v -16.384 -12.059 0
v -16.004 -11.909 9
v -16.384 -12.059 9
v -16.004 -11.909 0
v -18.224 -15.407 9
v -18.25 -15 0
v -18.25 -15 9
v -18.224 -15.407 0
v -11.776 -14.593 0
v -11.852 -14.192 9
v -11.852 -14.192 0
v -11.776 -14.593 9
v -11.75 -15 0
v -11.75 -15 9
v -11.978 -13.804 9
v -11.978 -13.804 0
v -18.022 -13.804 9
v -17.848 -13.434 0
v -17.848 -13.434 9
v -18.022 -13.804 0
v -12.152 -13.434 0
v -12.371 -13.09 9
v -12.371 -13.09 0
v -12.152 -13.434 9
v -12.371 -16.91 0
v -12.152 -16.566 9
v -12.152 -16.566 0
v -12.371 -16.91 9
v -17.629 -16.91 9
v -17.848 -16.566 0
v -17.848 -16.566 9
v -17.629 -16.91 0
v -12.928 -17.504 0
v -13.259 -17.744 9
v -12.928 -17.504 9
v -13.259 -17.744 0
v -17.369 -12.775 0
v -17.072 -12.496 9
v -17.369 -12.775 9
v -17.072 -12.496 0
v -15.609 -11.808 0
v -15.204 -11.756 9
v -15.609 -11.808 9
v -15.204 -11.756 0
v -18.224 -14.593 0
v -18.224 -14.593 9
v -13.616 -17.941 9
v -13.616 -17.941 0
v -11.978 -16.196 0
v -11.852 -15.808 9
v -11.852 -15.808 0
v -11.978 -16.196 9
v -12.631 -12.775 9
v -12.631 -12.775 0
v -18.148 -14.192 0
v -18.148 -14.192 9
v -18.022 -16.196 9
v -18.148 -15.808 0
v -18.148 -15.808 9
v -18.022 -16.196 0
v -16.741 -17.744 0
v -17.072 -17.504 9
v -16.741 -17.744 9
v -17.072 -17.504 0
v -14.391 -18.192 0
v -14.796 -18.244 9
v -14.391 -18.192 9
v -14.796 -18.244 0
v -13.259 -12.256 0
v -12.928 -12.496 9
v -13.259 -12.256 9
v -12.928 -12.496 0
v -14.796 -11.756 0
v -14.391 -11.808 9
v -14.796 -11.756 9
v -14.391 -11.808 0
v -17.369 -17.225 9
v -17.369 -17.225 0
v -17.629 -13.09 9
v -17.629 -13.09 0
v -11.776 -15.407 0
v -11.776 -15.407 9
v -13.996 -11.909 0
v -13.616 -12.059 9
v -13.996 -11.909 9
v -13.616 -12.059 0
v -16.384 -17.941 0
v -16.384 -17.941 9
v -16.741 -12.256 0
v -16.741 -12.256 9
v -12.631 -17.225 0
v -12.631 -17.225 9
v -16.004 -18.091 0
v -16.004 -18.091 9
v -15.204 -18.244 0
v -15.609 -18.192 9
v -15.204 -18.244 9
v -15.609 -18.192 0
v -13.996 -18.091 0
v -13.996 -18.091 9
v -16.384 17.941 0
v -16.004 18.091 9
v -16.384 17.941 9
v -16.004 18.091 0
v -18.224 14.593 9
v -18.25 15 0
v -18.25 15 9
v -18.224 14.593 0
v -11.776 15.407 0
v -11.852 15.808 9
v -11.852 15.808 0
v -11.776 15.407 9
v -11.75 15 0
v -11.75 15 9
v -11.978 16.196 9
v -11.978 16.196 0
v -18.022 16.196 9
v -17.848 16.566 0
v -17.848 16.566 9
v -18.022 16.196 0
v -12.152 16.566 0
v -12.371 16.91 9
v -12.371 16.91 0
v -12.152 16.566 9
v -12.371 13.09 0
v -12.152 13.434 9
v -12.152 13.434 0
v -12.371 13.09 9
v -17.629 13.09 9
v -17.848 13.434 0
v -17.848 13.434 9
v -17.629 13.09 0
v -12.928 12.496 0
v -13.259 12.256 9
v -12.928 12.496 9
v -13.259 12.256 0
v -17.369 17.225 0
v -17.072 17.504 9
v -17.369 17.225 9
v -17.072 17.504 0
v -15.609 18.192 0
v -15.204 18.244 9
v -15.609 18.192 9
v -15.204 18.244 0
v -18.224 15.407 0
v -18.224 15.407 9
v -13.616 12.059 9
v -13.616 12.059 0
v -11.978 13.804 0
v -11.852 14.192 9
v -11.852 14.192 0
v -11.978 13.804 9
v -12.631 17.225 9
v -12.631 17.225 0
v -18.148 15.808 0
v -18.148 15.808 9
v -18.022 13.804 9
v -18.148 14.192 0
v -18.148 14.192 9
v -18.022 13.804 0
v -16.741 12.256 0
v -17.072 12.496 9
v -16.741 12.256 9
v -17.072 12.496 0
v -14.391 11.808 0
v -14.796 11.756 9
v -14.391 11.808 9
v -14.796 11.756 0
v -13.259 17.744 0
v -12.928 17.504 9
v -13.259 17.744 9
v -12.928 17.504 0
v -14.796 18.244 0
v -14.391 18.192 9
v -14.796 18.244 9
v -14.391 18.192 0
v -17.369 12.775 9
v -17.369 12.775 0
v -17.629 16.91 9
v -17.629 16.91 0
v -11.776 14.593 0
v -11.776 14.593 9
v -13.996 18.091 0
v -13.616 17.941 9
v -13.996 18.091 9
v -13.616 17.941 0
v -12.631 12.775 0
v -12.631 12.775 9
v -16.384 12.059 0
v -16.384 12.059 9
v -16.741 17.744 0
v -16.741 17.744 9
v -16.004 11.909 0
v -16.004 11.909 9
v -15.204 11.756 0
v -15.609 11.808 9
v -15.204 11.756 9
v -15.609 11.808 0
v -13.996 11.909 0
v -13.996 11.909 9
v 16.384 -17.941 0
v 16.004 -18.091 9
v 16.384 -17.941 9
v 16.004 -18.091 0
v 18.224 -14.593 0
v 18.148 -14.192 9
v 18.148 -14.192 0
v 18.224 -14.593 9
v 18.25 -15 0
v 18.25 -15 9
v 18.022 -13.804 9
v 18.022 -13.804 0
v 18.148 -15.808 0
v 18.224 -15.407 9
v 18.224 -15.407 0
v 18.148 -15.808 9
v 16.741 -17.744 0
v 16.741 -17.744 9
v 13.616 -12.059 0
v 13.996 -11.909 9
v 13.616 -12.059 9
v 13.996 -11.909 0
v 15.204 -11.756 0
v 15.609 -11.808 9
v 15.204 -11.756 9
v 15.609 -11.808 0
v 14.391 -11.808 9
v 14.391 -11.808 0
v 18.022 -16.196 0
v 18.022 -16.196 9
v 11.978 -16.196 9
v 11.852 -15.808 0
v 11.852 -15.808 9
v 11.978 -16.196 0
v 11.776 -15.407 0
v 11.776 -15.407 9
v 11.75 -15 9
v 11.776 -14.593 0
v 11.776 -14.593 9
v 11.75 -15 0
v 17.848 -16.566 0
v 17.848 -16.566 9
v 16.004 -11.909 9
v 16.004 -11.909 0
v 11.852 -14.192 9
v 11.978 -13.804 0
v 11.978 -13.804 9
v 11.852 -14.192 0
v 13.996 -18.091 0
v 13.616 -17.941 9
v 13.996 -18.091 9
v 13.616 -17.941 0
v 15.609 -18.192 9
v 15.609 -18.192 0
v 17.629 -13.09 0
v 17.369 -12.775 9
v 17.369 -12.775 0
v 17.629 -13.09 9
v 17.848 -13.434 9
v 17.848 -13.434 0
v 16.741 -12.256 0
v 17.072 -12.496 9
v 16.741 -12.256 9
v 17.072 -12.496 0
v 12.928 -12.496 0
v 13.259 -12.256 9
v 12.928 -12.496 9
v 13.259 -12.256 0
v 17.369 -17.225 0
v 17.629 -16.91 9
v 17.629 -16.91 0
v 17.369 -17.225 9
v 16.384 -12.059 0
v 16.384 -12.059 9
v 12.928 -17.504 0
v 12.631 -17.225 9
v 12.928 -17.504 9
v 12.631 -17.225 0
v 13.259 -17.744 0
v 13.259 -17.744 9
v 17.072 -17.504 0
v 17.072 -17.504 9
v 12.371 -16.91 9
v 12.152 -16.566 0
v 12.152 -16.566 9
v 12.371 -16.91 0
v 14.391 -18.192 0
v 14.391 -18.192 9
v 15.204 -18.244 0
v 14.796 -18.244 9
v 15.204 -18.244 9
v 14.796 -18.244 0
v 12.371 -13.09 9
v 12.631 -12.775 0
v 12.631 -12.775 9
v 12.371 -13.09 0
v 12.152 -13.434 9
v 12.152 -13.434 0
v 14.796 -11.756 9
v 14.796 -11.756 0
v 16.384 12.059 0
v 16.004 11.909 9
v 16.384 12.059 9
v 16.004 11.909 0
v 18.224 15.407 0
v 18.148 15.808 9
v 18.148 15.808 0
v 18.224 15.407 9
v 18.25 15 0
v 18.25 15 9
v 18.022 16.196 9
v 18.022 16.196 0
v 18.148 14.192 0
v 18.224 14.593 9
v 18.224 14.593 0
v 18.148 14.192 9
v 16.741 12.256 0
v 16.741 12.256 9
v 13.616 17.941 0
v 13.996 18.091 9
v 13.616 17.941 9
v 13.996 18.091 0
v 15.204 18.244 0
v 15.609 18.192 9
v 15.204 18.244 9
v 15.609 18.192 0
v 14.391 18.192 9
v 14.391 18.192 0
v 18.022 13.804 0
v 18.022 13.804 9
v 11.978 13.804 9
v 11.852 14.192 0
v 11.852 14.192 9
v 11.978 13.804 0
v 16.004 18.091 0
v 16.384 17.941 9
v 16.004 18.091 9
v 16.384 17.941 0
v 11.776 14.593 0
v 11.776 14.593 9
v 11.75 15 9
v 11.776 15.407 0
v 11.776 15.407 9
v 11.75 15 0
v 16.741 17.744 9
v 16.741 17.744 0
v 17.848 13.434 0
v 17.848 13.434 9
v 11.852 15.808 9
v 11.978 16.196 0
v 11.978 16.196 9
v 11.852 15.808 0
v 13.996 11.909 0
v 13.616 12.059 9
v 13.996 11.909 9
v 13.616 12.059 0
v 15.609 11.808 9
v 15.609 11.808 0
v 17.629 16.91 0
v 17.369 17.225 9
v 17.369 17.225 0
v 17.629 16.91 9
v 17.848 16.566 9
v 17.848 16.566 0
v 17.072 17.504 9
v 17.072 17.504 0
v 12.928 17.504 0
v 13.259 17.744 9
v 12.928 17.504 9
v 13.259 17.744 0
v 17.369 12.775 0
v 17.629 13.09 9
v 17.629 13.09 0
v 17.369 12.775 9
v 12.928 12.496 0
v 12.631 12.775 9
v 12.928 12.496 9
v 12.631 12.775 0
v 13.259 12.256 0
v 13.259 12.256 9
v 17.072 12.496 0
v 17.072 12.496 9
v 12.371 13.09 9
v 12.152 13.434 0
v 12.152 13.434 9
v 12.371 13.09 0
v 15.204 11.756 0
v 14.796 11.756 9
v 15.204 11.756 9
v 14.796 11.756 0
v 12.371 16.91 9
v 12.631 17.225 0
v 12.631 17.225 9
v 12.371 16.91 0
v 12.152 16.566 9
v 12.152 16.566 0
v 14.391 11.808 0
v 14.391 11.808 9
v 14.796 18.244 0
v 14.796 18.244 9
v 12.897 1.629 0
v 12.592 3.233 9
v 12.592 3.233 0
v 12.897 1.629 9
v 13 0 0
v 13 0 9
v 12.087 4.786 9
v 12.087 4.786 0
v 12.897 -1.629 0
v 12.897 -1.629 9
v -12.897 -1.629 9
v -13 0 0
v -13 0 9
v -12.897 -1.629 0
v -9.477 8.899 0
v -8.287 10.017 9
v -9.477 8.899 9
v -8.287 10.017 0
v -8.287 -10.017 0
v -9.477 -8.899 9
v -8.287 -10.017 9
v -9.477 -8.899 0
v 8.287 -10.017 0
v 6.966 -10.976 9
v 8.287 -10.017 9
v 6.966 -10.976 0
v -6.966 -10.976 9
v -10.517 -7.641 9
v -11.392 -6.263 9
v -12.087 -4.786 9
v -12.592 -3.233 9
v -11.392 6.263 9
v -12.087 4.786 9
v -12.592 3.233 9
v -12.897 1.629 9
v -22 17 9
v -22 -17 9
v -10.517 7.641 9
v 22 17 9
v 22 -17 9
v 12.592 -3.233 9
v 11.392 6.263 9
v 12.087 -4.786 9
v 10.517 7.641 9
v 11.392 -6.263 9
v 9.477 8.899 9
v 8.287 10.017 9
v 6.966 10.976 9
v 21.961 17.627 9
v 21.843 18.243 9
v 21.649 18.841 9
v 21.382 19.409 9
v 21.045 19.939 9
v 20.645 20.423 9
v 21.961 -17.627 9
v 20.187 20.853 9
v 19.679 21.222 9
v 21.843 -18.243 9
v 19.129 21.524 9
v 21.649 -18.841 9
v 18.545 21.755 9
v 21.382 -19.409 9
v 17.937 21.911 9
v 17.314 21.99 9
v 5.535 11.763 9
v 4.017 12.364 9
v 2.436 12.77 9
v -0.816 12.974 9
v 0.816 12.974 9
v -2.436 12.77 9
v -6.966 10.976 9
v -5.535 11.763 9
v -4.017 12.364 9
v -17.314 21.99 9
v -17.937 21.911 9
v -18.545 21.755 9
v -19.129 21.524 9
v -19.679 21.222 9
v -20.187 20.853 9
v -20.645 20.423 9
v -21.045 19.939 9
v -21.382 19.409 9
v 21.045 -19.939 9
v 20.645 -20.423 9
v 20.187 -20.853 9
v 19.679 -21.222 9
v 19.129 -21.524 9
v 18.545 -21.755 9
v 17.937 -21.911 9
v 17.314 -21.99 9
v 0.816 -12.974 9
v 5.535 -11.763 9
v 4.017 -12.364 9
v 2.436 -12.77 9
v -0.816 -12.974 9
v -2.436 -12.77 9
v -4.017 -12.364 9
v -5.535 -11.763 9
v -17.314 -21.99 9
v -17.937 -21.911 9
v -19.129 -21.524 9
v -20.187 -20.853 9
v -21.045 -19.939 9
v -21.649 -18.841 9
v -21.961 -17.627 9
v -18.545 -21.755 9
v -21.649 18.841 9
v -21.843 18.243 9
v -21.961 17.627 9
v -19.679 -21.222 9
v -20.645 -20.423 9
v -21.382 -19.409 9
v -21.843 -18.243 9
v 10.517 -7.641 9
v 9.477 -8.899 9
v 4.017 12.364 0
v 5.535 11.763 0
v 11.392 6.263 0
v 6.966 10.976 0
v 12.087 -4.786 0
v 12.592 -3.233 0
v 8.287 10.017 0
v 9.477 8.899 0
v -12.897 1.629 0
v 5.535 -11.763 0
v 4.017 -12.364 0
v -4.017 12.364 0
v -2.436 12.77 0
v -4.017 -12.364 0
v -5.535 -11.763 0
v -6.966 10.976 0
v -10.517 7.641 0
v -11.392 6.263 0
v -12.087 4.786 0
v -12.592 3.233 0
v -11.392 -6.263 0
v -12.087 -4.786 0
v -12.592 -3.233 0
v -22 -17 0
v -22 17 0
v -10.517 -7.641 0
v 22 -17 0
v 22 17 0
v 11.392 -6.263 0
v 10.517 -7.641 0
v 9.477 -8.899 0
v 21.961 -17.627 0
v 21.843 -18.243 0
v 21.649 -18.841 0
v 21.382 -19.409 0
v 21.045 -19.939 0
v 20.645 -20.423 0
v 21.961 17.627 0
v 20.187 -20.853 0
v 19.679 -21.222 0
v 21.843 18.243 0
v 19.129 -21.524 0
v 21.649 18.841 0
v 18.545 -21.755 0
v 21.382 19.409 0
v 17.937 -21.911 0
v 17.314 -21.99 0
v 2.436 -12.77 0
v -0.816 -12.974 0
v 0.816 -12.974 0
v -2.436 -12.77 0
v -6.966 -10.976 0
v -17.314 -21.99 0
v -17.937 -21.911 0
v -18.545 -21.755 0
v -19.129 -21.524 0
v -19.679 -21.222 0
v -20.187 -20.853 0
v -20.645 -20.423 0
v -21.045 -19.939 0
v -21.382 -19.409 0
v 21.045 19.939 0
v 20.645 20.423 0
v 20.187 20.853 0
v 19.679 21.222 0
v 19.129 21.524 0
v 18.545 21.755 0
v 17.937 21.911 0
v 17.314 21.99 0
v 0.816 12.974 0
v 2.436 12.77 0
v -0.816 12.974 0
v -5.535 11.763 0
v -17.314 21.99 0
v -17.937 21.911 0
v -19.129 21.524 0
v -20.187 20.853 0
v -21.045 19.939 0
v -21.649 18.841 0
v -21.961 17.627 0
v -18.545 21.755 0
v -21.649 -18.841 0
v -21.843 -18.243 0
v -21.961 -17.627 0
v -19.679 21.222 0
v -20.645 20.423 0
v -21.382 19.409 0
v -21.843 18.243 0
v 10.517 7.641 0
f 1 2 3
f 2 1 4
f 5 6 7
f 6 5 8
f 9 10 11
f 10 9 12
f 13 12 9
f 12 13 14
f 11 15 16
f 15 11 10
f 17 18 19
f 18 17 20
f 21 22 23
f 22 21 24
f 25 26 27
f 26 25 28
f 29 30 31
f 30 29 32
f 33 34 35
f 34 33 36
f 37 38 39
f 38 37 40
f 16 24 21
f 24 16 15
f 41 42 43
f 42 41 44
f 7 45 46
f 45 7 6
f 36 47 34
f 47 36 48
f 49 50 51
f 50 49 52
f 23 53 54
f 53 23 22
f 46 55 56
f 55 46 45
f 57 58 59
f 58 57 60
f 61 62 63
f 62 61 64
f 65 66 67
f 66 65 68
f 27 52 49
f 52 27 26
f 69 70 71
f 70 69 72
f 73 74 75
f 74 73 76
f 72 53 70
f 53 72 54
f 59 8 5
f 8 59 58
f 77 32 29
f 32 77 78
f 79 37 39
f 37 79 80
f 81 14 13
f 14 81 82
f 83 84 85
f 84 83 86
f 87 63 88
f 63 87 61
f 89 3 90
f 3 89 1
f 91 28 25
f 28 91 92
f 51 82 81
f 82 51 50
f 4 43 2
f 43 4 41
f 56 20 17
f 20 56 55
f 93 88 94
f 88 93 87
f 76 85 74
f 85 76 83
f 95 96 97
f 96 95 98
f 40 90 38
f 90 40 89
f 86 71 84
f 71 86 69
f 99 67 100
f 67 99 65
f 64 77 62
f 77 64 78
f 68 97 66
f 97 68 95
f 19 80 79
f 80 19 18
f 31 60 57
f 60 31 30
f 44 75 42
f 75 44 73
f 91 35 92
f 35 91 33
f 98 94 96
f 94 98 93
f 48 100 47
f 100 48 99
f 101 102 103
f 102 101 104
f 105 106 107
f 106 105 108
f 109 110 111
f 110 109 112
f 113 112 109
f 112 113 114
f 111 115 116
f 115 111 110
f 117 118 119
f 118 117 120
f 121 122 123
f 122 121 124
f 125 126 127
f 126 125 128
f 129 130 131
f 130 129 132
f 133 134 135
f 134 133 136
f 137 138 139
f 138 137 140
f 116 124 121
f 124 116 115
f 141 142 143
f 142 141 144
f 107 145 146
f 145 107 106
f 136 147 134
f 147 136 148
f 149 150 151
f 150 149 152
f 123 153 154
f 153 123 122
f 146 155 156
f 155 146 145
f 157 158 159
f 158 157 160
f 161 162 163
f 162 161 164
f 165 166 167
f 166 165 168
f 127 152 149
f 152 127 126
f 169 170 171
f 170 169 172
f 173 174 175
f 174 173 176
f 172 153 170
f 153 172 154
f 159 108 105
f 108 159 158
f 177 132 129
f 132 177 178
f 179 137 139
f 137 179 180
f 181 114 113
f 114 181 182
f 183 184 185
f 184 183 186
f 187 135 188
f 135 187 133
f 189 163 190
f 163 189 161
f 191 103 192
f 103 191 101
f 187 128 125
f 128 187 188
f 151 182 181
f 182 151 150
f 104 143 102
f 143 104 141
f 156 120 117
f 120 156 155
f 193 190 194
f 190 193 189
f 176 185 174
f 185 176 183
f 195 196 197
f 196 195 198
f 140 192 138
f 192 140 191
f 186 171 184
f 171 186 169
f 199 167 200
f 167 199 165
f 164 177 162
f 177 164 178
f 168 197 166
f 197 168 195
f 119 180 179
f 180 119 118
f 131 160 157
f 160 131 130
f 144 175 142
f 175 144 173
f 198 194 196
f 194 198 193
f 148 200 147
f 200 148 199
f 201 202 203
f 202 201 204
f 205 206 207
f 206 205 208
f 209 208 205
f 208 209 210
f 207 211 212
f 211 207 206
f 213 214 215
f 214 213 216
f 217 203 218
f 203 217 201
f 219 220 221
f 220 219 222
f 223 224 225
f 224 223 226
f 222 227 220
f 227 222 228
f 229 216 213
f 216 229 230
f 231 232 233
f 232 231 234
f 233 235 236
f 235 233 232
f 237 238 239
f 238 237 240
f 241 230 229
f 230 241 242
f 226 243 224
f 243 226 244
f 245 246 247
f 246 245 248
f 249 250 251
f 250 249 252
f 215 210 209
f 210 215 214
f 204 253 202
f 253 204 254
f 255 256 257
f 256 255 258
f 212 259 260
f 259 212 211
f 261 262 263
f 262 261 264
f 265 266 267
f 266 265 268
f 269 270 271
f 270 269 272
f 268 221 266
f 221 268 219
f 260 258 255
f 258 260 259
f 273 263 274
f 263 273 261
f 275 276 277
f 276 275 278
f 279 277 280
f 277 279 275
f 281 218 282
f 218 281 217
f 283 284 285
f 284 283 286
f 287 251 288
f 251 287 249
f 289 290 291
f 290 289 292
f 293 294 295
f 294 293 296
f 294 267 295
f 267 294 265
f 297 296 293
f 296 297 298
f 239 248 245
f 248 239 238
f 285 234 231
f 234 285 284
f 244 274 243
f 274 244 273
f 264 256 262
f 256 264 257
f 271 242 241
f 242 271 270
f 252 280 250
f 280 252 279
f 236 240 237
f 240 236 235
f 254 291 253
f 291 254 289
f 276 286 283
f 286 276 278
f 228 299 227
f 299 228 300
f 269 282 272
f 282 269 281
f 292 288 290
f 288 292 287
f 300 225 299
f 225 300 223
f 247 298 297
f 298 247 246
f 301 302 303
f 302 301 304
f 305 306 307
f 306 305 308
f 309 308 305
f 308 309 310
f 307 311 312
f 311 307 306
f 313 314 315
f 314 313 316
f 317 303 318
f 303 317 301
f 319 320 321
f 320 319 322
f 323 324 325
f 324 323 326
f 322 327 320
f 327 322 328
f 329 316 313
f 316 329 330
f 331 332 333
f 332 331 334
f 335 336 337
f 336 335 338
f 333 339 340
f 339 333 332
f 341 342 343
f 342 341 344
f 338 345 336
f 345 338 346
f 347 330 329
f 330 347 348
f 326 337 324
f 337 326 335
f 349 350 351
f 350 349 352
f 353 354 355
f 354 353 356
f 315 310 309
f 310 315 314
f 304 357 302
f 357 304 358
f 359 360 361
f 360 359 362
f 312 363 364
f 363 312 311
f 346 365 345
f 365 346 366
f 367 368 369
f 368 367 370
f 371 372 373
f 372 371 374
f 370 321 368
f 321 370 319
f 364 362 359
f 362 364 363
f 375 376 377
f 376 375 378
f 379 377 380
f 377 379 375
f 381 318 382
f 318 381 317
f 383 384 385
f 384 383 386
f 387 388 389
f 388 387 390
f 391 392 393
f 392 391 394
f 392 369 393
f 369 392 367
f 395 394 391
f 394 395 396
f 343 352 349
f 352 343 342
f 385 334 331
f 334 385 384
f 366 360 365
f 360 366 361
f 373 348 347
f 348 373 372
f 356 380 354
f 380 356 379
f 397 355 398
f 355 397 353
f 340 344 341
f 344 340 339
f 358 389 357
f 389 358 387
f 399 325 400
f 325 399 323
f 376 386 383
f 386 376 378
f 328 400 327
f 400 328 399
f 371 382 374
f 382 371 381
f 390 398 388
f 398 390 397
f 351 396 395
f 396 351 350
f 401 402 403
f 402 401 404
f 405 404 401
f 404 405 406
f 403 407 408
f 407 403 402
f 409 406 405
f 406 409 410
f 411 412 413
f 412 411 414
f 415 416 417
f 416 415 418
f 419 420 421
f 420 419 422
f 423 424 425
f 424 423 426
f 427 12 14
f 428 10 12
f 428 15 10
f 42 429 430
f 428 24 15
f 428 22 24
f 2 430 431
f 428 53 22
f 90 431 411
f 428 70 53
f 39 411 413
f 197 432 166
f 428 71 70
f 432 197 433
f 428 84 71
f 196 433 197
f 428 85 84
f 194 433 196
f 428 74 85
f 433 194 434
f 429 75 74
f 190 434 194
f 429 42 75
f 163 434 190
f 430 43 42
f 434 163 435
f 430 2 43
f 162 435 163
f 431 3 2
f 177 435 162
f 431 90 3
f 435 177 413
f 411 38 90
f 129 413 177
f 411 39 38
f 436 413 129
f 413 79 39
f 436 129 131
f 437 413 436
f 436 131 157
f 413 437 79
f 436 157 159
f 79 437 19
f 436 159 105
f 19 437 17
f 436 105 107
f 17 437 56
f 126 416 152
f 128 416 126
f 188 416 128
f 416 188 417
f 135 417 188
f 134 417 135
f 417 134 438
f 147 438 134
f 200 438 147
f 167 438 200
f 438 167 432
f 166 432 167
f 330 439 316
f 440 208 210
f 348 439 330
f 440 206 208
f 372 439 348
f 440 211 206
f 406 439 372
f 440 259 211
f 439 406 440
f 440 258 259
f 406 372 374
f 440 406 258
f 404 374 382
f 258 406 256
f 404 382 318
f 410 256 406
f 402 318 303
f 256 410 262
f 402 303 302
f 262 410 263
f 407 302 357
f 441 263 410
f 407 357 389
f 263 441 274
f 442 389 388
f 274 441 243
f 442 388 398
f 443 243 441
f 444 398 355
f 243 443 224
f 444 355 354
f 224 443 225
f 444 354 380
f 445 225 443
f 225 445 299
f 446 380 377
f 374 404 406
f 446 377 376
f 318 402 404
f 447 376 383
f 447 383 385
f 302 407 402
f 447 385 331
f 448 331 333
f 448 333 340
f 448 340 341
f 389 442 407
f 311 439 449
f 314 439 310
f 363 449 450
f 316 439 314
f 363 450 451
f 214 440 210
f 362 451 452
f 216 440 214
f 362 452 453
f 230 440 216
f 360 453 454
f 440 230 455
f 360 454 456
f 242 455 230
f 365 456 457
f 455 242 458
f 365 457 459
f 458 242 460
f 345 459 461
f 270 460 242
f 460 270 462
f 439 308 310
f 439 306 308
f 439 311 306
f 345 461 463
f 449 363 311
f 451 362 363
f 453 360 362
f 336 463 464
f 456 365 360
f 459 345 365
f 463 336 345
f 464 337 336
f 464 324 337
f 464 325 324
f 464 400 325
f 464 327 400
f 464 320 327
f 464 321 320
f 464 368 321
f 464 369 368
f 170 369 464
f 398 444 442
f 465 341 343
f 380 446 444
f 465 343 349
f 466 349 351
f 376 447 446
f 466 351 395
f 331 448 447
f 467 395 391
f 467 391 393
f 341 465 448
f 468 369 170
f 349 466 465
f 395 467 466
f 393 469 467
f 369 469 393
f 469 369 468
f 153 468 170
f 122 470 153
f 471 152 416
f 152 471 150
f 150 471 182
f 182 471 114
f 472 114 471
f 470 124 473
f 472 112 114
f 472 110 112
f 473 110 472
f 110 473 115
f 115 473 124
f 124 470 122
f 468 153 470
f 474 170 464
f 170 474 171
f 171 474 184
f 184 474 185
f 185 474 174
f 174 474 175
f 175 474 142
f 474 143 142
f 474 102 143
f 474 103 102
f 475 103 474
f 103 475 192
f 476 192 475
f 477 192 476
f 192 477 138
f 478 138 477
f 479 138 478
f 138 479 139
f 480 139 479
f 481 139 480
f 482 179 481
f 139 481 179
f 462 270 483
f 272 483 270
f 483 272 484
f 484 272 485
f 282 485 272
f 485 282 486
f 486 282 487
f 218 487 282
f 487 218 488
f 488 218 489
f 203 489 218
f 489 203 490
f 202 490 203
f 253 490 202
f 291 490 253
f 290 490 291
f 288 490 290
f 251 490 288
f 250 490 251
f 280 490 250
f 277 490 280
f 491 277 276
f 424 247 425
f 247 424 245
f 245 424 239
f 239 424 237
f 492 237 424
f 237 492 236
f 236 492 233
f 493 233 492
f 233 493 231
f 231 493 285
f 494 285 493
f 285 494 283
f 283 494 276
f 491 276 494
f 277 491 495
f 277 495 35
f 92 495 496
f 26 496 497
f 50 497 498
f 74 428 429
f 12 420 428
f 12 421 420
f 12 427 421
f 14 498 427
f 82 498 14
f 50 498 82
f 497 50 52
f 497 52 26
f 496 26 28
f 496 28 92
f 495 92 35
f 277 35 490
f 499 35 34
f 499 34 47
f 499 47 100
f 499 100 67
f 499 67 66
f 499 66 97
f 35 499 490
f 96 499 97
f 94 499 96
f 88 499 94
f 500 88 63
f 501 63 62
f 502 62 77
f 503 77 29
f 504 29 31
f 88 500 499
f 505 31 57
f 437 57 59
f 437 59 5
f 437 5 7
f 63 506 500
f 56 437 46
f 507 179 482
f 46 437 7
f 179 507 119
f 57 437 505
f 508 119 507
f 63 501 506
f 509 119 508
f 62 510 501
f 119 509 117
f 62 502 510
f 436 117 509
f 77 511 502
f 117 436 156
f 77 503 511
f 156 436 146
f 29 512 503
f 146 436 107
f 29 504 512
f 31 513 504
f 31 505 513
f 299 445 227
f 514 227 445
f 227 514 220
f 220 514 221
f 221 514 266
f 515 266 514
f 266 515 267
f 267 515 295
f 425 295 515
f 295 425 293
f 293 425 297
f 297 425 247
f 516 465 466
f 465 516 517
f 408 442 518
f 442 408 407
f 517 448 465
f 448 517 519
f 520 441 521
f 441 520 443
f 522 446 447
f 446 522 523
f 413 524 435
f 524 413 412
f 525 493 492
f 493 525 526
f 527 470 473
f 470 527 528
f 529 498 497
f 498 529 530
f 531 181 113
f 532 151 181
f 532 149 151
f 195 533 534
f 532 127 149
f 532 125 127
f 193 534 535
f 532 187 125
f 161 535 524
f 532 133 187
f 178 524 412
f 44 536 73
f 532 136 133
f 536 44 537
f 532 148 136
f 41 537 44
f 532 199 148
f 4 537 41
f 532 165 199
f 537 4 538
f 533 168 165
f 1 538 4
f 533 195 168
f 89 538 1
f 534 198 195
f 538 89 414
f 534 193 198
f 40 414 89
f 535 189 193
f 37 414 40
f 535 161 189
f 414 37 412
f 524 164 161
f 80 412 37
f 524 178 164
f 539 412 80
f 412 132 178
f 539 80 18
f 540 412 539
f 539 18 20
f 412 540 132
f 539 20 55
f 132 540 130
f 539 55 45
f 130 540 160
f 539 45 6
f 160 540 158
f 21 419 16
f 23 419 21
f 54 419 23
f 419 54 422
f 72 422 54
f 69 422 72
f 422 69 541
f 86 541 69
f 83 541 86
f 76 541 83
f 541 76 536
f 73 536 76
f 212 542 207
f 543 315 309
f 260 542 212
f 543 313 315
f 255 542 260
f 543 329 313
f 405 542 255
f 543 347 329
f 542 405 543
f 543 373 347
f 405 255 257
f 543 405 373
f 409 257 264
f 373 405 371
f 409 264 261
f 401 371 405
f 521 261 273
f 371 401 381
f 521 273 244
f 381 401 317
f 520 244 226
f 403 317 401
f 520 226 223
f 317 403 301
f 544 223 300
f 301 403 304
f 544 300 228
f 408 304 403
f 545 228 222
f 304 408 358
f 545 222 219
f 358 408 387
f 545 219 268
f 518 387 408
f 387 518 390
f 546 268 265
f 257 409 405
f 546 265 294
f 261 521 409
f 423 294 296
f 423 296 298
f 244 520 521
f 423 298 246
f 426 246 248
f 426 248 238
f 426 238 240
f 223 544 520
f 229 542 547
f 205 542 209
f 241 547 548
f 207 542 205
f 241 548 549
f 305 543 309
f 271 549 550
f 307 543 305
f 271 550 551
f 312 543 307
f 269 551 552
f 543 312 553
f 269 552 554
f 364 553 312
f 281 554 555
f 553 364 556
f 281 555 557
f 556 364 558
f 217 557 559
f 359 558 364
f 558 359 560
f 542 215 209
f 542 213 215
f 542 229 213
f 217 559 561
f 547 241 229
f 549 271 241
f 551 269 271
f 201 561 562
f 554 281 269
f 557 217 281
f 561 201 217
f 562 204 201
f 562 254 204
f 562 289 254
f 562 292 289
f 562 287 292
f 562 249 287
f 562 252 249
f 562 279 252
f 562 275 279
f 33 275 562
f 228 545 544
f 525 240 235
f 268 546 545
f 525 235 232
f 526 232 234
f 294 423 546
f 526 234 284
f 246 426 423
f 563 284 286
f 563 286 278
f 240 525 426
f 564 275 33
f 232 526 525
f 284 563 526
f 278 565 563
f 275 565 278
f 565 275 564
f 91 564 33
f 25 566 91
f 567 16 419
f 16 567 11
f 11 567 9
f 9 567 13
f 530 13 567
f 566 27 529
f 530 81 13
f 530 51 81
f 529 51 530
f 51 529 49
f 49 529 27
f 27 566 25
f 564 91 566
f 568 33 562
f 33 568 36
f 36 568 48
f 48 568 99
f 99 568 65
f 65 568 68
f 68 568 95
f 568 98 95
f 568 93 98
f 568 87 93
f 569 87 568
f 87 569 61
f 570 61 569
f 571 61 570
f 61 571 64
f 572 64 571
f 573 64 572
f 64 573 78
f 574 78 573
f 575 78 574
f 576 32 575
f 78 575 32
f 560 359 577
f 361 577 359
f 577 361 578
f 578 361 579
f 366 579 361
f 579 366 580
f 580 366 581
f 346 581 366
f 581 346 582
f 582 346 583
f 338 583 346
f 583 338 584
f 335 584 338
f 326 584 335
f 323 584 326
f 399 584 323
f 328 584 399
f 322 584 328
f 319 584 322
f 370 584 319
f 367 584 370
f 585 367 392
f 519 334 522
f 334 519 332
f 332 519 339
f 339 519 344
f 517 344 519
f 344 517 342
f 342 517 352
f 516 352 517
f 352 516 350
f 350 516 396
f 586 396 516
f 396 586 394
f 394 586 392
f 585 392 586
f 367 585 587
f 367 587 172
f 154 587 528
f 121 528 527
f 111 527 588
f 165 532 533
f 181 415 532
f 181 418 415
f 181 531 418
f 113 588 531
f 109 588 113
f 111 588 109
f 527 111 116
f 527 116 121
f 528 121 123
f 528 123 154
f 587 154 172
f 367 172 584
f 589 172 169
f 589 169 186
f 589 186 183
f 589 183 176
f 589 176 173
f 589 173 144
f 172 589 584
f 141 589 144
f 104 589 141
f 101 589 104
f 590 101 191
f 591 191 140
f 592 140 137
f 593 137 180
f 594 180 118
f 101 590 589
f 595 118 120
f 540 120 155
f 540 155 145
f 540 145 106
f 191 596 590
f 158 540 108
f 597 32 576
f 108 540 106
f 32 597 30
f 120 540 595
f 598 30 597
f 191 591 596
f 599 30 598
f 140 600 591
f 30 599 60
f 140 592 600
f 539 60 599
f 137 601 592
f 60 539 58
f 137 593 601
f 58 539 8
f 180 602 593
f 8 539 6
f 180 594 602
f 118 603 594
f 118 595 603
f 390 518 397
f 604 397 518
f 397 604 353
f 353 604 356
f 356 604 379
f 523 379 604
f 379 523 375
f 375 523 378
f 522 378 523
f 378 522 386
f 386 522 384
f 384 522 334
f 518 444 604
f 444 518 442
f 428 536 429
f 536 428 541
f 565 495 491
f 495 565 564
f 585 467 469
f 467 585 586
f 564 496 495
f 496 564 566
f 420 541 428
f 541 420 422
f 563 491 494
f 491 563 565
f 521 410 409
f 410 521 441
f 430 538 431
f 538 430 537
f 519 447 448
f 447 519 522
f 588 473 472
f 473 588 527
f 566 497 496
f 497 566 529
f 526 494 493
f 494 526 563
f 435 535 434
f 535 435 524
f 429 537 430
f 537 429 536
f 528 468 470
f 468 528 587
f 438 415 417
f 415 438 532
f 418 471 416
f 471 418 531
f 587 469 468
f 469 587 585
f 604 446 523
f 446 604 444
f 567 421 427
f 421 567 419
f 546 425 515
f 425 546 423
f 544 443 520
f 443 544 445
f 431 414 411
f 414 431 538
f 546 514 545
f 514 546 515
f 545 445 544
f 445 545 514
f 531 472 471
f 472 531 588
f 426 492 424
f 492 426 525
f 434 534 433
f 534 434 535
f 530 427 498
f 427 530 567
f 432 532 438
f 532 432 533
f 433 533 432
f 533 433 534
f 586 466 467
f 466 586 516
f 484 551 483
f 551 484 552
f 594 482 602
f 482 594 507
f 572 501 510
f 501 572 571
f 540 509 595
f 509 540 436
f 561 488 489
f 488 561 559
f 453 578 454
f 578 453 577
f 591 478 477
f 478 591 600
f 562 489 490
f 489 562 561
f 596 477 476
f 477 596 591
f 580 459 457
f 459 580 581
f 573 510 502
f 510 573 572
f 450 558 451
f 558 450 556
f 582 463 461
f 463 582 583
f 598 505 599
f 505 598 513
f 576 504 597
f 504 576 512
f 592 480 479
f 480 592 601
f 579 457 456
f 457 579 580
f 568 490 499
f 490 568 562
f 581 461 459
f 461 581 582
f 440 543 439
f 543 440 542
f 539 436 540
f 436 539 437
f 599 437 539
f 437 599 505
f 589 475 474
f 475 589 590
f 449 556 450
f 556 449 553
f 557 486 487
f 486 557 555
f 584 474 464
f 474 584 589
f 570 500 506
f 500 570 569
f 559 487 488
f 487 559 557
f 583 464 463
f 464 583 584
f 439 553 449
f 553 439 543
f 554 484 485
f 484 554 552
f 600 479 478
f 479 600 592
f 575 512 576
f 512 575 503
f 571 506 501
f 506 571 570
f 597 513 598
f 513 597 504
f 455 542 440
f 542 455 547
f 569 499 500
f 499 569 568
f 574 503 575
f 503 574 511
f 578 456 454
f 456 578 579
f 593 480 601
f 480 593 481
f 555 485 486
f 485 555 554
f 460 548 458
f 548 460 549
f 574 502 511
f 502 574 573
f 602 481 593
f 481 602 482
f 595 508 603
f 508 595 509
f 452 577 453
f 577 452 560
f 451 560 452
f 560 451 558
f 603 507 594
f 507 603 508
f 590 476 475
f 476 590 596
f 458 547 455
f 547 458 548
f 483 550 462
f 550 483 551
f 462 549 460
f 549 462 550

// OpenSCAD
$fn = 50;

difference() {
	union() {
		hull() {
			translate(v = [-17.0, 17.0, 0]) {
				cylinder(h = 9, r = 5);
			}
			translate(v = [17.0, 17.0, 0]) {
				cylinder(h = 9, r = 5);
			}
			translate(v = [-17.0, -17.0, 0]) {
				cylinder(h = 9, r = 5);
			}
			translate(v = [17.0, -17.0, 0]) {
				cylinder(h = 9, r = 5);
			}
		}
	}
	union() {
		translate(v = [-15.0, -15.0, -100.0]) {
			cylinder(h = 200, r = 3.25);
		}
		translate(v = [-15.0, 15.0, -100.0]) {
			cylinder(h = 200, r = 3.25);
		}
		translate(v = [15.0, -15.0, -100.0]) {
			cylinder(h = 200, r = 3.25);
		}
		translate(v = [15.0, 15.0, -100.0]) {
			cylinder(h = 200, r = 3.25);
		}
		translate(v = [-15.0, -15.0, -100.0]) {
			cylinder(h = 200, r = 1.8);
		}
		translate(v = [-15.0, 15.0, -100.0]) {
			cylinder(h = 200, r = 1.8);
		}
		translate(v = [15.0, -15.0, -100.0]) {
			cylinder(h = 200, r = 1.8);
		}
		translate(v = [15.0, 15.0, -100.0]) {
			cylinder(h = 200, r = 1.8);
		}
		cylinder(h = 9, r = 13.0);
	}
}
